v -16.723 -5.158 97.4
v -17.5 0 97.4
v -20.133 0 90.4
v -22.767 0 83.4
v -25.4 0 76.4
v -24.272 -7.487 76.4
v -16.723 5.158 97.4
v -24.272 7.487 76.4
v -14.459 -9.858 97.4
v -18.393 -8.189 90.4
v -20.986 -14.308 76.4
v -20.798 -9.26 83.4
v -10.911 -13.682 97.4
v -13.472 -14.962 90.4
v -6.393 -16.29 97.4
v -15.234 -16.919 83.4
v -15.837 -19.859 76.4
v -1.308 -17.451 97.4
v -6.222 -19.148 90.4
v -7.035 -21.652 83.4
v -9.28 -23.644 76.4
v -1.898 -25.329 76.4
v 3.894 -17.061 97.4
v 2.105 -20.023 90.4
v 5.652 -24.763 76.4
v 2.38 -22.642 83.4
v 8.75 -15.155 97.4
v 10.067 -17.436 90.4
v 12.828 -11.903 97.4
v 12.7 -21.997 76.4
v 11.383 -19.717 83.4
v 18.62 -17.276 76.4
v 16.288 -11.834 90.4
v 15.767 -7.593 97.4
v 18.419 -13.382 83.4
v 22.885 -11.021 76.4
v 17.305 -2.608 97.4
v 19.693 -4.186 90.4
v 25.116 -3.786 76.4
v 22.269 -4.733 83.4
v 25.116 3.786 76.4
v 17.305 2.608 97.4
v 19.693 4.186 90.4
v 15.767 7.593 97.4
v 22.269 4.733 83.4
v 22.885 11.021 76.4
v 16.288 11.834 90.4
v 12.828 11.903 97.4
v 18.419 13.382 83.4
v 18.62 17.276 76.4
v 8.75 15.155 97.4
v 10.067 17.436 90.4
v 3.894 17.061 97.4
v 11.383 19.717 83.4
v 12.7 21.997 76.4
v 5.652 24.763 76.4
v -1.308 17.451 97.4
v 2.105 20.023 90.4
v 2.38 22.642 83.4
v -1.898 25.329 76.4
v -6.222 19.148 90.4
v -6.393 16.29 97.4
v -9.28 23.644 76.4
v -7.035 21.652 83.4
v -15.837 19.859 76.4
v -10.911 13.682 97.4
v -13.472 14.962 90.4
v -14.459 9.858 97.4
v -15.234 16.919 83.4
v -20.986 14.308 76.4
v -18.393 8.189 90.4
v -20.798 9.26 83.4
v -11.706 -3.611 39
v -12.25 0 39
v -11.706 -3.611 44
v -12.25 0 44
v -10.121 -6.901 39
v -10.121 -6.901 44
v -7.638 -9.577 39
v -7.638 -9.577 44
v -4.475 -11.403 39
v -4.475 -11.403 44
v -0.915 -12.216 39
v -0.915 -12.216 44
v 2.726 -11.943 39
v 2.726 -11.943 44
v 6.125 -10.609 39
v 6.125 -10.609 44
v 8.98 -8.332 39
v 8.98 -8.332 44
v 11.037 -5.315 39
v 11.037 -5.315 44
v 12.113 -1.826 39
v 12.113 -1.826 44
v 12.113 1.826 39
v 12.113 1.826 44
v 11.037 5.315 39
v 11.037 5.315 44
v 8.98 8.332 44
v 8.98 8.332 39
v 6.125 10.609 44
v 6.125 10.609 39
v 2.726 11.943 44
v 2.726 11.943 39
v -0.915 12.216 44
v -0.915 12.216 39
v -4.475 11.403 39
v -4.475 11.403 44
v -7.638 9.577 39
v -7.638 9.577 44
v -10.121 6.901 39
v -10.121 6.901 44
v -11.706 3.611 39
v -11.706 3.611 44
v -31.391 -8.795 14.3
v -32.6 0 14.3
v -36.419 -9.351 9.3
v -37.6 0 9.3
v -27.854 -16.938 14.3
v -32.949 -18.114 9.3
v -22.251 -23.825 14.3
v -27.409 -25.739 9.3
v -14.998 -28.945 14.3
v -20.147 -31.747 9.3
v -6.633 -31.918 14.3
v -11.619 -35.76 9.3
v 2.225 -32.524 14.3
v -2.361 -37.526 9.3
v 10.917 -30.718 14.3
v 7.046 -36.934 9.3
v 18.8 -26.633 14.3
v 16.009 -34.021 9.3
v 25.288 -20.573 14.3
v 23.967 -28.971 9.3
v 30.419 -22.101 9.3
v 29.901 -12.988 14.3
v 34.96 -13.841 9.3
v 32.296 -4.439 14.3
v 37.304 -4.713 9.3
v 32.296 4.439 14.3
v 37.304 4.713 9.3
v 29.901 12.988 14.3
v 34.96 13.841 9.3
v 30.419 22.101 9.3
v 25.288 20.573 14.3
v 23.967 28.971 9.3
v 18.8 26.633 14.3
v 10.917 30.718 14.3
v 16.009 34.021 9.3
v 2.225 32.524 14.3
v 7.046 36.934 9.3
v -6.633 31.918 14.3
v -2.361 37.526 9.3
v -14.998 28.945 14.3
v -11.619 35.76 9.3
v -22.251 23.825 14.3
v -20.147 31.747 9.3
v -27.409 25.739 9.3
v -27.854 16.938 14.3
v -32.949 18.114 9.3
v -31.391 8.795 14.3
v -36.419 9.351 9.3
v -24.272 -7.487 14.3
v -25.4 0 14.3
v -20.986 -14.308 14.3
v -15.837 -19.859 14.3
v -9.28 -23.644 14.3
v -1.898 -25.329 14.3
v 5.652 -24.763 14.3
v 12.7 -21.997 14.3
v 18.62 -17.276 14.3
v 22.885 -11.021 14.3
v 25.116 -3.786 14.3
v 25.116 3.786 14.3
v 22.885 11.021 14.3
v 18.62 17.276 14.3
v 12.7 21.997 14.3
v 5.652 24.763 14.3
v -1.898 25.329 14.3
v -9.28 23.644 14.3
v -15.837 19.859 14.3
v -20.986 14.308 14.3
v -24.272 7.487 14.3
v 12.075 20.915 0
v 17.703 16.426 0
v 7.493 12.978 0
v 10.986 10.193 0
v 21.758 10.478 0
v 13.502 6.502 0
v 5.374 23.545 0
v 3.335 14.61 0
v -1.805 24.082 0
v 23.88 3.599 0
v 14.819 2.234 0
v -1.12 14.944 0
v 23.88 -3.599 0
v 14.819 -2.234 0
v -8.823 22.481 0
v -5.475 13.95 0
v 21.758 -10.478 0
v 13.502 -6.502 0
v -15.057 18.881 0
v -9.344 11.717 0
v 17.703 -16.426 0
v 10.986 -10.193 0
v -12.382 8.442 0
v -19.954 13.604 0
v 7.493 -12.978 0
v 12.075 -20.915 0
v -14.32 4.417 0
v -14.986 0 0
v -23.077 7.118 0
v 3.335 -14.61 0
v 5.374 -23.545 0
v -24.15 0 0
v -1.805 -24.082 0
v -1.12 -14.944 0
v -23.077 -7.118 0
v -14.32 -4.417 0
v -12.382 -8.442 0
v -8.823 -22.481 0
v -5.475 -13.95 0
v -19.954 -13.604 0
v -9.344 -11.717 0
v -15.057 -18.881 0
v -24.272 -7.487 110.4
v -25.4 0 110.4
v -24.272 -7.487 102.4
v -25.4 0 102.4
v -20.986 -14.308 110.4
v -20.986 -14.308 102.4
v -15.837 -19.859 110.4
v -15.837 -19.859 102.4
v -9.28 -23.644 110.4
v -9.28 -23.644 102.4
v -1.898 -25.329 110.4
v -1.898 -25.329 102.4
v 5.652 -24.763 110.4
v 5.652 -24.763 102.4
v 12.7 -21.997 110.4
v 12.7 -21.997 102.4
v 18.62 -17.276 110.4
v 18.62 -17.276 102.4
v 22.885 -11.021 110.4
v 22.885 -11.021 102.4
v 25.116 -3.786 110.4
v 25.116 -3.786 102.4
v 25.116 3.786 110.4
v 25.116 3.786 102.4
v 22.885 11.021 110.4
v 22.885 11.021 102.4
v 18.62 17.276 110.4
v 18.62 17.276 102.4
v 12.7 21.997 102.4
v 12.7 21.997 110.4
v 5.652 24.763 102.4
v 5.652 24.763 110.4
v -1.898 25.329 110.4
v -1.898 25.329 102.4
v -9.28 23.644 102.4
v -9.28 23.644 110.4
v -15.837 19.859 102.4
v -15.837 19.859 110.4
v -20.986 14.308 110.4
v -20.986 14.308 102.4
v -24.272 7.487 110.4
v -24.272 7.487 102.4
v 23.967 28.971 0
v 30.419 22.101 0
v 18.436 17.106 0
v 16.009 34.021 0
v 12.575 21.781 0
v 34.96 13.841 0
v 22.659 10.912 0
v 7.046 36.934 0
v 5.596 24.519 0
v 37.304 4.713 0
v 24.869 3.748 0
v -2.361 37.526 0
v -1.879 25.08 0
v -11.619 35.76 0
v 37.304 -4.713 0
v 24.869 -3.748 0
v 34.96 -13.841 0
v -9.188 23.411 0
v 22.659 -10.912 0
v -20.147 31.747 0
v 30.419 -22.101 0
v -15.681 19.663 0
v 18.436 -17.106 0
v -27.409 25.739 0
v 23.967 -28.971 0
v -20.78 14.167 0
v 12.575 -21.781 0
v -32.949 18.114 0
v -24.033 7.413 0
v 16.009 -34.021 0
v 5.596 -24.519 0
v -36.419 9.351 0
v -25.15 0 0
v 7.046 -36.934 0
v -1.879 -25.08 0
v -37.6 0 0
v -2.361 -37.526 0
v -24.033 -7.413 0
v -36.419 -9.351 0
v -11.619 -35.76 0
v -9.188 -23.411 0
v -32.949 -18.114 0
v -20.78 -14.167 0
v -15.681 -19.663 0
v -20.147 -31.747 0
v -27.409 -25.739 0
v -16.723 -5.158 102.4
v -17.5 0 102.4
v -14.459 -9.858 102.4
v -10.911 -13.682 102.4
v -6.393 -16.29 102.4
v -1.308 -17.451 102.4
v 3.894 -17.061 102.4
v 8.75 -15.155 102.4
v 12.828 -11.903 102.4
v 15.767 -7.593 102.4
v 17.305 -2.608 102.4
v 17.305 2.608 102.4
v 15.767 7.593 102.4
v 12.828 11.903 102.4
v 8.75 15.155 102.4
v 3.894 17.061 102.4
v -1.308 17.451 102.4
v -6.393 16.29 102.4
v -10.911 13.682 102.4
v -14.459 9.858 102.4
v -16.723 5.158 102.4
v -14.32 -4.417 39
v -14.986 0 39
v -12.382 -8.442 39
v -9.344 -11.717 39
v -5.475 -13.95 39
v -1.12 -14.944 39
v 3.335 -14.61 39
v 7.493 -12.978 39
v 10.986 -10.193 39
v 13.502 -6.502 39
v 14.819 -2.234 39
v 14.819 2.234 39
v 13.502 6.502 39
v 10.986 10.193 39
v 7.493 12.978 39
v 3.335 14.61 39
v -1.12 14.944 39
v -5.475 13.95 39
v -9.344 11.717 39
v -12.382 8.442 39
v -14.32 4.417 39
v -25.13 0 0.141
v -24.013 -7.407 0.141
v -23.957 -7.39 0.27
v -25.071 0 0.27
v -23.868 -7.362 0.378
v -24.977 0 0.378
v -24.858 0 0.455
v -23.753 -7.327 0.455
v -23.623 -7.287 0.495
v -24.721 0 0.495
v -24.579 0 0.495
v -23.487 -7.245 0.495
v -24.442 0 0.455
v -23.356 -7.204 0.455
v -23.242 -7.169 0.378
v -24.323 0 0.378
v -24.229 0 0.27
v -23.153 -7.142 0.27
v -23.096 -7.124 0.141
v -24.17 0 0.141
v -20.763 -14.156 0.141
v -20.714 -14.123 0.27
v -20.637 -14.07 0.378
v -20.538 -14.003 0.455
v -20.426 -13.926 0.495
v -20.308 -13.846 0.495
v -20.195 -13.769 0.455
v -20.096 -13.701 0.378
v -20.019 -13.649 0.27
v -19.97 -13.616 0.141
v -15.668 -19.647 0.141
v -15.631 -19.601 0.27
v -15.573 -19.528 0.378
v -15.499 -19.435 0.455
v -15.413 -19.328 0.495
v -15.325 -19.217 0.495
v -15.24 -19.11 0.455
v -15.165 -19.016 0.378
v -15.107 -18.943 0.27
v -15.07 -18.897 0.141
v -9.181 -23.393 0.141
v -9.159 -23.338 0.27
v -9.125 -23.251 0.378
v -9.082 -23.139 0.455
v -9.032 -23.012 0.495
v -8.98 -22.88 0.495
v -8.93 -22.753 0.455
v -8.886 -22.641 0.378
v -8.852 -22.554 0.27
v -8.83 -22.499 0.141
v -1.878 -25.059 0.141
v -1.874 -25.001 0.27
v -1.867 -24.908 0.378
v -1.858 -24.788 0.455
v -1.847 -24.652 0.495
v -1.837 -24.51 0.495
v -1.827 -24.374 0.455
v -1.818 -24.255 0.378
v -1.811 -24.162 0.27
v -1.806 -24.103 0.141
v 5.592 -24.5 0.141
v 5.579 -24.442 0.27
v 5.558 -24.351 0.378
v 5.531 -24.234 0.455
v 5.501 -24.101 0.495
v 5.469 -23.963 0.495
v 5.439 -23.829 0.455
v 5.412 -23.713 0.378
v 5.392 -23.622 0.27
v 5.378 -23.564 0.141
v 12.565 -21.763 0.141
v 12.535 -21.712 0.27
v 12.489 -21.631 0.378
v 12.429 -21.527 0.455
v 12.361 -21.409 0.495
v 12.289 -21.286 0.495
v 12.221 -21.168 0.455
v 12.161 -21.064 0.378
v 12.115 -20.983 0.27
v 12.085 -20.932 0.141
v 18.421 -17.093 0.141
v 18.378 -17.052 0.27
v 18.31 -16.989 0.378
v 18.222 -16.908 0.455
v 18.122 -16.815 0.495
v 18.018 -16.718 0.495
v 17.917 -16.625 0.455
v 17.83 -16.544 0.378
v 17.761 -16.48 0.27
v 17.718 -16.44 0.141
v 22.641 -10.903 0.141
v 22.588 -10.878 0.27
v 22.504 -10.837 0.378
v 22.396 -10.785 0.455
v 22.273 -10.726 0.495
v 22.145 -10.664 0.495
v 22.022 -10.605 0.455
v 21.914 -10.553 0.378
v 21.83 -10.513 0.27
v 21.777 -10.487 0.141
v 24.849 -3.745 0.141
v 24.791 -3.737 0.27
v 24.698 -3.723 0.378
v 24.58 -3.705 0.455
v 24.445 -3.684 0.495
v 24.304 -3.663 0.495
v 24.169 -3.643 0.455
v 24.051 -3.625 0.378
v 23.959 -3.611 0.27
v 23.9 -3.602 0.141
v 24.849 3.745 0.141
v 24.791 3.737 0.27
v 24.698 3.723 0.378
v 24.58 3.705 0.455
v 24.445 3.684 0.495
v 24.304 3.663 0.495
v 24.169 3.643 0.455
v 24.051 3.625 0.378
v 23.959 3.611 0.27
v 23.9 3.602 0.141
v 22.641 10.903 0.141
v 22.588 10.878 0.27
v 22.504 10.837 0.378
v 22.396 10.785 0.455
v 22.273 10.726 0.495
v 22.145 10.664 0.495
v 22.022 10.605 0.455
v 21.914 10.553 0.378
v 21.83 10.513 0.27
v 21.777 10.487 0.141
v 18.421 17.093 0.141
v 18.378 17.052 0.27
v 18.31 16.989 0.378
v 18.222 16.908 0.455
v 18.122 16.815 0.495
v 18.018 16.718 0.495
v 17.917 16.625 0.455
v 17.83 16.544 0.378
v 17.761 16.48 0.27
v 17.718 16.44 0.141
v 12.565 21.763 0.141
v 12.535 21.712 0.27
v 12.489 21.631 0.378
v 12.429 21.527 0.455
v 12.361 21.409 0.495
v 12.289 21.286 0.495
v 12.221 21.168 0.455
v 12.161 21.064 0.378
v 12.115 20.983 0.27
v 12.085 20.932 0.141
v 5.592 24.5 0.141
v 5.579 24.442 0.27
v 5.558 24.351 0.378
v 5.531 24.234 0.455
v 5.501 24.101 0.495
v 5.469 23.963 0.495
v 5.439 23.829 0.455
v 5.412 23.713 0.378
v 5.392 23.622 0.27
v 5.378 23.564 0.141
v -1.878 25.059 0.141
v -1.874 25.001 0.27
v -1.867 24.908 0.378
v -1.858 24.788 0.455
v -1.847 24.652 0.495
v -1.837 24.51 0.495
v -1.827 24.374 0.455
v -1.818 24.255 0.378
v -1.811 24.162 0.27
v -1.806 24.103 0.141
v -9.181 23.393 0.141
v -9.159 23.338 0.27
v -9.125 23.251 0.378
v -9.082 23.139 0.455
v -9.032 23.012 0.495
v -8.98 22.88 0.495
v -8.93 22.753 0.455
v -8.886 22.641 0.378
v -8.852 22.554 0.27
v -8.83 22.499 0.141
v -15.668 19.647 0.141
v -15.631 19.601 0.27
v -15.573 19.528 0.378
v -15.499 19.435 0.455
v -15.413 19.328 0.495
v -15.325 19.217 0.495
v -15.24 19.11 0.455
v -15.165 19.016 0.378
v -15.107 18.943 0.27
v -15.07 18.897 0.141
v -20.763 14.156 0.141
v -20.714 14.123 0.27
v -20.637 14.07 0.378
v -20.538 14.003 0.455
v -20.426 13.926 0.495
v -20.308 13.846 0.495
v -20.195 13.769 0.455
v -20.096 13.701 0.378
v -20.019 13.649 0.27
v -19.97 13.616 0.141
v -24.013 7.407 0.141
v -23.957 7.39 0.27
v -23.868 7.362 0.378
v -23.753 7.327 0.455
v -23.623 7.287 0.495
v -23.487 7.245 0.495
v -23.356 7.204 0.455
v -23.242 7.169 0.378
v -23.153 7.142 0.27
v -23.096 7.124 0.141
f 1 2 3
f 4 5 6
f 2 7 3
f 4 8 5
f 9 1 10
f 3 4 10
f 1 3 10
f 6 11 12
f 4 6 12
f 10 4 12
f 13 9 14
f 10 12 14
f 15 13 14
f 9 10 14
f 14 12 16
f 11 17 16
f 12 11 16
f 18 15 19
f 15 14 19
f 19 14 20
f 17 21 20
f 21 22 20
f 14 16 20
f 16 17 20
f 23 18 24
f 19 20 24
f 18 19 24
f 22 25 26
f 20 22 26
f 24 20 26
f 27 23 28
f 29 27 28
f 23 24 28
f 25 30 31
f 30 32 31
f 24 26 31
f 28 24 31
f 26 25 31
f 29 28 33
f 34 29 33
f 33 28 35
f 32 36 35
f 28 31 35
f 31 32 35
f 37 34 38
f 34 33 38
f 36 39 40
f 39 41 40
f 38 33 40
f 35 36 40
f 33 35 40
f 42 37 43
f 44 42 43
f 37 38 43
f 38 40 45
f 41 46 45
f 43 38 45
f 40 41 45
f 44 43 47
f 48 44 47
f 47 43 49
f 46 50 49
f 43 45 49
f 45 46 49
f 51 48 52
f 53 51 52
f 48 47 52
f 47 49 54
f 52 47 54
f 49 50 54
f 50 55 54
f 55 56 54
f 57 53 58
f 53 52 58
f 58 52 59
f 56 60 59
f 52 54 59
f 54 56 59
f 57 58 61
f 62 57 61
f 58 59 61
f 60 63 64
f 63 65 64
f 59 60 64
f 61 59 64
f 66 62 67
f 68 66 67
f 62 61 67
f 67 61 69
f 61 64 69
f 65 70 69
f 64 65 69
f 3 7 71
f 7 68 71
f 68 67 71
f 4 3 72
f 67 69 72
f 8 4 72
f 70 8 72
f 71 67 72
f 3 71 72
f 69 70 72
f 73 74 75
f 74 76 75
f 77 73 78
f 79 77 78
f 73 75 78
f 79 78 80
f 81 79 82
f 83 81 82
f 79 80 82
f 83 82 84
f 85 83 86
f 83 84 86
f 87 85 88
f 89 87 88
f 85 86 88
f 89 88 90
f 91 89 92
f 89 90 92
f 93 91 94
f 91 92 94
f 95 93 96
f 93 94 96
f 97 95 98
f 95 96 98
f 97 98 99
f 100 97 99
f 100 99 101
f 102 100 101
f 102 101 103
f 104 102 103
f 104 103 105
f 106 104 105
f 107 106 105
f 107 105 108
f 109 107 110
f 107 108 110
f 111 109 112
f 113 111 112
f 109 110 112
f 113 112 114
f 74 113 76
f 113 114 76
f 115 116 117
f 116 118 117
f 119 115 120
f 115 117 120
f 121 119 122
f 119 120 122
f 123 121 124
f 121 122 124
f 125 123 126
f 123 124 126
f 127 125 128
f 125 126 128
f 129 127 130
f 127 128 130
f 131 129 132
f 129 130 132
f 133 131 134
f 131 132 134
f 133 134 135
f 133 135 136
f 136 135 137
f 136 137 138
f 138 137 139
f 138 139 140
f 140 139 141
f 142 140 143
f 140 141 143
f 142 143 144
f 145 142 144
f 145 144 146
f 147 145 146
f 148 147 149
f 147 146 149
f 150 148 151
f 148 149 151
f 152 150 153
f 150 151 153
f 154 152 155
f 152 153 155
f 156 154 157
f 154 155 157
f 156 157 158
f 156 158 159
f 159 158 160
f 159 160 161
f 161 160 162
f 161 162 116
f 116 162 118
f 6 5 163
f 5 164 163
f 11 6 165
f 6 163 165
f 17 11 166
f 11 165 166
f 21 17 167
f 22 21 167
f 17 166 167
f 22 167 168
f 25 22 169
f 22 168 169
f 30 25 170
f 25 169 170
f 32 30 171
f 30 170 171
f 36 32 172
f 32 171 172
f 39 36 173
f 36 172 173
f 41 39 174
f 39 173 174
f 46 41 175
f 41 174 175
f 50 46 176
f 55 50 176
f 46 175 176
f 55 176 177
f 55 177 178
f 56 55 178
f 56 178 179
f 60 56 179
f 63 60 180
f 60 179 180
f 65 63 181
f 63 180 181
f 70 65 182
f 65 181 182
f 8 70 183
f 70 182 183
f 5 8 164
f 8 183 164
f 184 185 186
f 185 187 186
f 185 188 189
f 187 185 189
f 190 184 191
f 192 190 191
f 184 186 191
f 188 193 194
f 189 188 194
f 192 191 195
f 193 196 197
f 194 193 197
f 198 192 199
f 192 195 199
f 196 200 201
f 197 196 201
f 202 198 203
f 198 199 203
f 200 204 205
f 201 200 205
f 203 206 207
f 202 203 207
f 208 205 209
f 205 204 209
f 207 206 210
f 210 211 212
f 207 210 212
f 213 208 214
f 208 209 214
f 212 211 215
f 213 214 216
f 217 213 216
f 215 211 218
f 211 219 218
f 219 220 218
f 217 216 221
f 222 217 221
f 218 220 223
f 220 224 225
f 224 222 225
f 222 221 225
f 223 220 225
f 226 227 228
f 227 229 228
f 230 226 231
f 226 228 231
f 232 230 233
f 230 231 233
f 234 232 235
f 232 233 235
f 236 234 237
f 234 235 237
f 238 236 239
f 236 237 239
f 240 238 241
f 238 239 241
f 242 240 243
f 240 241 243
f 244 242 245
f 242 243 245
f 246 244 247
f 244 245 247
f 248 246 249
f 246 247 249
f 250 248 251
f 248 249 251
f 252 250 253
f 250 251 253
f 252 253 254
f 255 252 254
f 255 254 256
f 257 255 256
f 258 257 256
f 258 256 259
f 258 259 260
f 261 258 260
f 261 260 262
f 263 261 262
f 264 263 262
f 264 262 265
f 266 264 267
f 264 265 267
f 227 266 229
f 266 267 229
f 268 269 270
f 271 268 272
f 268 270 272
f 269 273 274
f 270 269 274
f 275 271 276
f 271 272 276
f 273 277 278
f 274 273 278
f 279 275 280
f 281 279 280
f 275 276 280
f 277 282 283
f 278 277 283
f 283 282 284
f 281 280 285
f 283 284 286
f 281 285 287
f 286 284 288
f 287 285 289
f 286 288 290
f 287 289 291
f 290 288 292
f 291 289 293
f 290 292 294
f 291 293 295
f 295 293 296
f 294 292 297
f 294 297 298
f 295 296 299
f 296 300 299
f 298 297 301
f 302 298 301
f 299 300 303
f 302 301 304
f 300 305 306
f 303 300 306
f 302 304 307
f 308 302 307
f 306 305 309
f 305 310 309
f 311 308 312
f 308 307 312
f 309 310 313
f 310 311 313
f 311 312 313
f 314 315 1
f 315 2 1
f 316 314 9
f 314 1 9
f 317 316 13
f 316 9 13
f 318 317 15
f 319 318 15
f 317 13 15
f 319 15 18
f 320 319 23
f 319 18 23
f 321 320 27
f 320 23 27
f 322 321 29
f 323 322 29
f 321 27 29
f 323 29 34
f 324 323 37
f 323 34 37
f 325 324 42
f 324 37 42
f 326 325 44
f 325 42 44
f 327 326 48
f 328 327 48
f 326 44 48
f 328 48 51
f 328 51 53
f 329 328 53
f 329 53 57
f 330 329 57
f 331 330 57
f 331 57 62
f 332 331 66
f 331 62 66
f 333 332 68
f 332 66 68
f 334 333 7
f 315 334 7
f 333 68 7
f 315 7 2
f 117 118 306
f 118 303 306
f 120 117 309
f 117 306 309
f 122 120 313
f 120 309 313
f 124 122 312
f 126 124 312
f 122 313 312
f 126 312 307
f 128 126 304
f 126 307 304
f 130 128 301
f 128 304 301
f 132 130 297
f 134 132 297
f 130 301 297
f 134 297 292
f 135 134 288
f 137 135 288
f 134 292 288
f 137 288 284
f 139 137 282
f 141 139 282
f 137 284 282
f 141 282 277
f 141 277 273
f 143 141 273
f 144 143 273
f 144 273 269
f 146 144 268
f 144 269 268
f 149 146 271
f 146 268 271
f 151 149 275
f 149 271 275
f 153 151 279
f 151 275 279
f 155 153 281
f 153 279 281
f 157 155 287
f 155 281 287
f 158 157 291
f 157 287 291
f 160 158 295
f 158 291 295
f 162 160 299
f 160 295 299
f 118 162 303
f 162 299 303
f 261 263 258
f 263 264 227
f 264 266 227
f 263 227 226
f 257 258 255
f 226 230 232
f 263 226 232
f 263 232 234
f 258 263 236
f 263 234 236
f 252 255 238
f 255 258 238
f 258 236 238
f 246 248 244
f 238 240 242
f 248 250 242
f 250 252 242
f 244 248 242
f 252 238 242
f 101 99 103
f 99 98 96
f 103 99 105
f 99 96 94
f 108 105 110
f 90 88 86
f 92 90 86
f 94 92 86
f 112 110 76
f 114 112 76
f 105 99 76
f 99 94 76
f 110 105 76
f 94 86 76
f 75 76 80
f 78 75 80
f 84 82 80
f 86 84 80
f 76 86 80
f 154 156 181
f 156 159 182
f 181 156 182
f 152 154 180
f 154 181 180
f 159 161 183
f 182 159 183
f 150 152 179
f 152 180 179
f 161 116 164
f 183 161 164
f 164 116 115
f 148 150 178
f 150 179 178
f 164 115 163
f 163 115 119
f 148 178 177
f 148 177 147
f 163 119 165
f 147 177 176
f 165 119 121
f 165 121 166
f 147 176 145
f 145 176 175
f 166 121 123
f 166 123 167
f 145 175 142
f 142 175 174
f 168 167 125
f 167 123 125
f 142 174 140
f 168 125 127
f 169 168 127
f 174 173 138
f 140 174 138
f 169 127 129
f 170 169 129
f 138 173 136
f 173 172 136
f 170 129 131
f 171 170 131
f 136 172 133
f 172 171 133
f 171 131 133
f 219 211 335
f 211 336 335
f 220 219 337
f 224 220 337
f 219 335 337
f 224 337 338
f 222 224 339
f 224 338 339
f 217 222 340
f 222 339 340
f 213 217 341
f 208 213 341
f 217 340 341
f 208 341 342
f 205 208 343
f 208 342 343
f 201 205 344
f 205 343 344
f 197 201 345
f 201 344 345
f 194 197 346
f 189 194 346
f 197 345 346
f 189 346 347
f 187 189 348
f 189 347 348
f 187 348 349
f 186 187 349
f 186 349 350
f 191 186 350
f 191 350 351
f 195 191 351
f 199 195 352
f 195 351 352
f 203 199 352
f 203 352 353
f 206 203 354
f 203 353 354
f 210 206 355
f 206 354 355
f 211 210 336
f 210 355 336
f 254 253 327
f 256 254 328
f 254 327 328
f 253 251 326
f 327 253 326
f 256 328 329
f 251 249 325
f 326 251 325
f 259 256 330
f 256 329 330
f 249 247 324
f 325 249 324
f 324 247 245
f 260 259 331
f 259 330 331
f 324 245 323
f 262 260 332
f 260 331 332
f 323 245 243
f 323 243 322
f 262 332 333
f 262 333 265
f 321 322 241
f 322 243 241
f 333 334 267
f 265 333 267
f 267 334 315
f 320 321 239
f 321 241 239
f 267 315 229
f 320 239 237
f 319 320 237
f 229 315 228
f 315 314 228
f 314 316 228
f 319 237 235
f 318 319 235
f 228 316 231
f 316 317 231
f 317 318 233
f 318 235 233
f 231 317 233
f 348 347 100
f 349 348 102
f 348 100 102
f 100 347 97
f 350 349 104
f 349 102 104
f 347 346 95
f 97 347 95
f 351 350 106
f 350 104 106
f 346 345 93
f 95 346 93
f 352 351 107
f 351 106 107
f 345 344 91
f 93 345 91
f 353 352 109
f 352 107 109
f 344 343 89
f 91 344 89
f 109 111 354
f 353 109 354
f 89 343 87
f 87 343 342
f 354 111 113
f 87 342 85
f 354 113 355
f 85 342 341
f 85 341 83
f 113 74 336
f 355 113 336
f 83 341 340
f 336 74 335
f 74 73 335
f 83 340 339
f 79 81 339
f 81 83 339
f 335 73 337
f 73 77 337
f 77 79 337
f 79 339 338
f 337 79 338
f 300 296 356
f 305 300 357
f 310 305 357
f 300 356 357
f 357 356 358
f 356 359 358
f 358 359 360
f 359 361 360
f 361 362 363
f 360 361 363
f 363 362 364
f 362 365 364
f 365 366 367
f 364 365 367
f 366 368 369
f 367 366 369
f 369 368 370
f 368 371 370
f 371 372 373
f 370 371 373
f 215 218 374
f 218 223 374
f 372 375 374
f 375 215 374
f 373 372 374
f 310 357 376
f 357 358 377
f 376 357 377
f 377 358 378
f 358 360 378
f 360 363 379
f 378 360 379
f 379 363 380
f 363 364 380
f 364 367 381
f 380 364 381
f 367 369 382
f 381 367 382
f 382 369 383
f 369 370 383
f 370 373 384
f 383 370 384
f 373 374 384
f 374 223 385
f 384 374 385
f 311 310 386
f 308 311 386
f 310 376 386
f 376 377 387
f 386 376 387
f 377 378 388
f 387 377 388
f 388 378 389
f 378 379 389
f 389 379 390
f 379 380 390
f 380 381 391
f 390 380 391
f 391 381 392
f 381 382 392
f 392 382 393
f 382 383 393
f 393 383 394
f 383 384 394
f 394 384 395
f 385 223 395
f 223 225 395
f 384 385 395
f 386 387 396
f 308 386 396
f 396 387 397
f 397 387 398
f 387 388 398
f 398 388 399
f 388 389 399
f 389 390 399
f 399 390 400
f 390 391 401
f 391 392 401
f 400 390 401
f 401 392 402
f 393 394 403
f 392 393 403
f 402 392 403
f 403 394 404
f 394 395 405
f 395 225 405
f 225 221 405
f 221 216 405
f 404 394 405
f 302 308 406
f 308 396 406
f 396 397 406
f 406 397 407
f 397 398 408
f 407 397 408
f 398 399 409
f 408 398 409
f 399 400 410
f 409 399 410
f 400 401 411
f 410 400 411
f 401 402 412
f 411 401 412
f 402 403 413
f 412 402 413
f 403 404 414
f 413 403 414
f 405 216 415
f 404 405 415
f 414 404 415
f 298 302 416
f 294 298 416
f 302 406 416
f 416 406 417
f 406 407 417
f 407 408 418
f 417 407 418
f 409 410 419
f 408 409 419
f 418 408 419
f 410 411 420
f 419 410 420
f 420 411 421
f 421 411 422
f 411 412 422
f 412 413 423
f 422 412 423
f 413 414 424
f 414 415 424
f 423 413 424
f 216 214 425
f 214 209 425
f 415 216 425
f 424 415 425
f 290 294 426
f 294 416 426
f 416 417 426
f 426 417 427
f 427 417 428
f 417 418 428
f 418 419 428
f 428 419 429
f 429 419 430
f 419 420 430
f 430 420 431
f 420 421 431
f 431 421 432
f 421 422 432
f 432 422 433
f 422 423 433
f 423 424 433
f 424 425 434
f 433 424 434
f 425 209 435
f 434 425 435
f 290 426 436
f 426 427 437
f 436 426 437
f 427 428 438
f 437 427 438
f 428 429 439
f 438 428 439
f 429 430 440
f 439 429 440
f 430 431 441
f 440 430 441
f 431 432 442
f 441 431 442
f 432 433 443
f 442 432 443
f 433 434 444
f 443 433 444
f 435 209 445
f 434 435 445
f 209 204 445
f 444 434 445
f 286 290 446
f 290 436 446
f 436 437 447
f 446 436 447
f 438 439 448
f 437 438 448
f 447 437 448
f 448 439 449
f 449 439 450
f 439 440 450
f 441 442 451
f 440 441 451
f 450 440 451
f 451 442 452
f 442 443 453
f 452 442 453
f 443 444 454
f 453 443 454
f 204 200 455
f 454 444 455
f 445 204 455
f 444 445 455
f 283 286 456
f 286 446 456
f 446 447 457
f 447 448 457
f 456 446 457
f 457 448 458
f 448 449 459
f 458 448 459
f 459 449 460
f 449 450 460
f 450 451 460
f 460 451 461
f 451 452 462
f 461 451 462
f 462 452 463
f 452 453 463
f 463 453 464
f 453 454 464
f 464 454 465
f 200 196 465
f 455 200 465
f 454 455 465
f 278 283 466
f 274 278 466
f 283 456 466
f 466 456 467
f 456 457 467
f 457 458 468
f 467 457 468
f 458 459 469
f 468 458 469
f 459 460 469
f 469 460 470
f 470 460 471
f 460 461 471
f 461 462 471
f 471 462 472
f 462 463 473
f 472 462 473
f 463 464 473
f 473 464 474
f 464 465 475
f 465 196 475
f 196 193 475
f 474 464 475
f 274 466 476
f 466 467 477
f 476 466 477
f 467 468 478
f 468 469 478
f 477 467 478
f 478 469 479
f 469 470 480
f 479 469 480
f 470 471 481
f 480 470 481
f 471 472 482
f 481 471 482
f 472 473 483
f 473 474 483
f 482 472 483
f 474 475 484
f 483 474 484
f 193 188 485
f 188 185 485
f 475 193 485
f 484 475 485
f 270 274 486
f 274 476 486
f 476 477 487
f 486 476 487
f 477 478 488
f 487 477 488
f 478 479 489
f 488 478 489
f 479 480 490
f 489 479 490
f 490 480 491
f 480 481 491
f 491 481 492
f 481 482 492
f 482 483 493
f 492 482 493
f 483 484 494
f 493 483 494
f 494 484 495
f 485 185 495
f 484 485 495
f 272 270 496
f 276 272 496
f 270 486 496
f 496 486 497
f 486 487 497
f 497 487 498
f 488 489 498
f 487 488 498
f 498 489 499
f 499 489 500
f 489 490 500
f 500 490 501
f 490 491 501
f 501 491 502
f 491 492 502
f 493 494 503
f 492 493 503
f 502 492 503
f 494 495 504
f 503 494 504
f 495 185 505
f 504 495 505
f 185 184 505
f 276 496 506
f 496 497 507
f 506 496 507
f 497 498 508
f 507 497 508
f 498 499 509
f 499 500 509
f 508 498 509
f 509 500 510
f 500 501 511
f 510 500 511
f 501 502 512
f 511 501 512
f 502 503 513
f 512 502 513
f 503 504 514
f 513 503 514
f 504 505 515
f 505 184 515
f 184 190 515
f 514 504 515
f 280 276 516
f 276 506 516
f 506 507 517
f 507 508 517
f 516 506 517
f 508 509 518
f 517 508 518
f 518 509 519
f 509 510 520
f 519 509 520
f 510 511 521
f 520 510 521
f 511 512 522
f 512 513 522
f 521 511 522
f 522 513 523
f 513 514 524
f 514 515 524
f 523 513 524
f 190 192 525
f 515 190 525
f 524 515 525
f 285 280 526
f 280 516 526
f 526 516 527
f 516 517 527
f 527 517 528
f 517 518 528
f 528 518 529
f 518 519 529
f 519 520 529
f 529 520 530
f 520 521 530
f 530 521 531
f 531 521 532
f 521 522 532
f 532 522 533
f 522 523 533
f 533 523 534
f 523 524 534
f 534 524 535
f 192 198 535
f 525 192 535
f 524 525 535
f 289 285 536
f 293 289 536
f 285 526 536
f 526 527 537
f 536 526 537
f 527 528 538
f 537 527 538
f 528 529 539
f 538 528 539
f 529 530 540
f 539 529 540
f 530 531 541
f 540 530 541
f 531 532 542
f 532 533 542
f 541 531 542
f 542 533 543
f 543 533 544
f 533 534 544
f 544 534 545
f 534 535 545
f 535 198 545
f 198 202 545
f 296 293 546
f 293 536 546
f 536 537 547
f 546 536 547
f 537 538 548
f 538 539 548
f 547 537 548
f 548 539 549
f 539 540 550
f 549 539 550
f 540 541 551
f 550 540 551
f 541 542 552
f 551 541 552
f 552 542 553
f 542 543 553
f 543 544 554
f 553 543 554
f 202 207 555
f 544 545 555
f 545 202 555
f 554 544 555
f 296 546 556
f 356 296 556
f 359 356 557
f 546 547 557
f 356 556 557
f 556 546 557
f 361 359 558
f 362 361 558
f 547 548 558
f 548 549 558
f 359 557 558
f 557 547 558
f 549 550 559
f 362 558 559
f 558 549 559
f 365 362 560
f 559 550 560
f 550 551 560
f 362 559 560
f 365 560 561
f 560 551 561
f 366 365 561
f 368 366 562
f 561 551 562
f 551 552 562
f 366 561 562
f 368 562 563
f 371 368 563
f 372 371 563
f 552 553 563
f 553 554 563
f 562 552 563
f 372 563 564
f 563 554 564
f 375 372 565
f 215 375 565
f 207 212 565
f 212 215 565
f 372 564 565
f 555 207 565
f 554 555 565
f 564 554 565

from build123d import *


with BuildPart() as f1:
    # F0 (on Front) → F1 (revolve)
    with BuildSketch(Plane.XZ):
        with BuildLine():
            Line((-37.6, 9.3), (-37.6, 0))
            Line((-37.6, 0), (-25.15, 0))
            ThreePointArc((-25.15, 0), (-24.65, 0.5), (-24.15, 0))
            Line((-24.15, 0), (-14.986, 0))
            Line((-14.986, 0), (-14.986, 39))
            Line((-14.986, 39), (-12.25, 39))
            Line((-12.25, 39), (-12.25, 44))
            Line((-12.25, 44), (0, 44))
            Line((0, 44), (0, 110.4))
            Line((0, 110.4), (-25.4, 110.4))
            Line((-25.4, 110.4), (-25.4, 102.4))
            Line((-25.4, 102.4), (-17.5, 102.4))
            Line((-17.5, 102.4), (-17.5, 97.4))
            Line((-17.5, 97.4), (-25.4, 76.4))
            Line((-25.4, 76.4), (-25.4, 14.3))
            Line((-25.4, 14.3), (-32.6, 14.3))
            Line((-32.6, 14.3), (-37.6, 9.3))
        make_face()
    revolve(axis=Axis((0, 0, 62.623069), (0, 0, 1)))


solid = f1.part
